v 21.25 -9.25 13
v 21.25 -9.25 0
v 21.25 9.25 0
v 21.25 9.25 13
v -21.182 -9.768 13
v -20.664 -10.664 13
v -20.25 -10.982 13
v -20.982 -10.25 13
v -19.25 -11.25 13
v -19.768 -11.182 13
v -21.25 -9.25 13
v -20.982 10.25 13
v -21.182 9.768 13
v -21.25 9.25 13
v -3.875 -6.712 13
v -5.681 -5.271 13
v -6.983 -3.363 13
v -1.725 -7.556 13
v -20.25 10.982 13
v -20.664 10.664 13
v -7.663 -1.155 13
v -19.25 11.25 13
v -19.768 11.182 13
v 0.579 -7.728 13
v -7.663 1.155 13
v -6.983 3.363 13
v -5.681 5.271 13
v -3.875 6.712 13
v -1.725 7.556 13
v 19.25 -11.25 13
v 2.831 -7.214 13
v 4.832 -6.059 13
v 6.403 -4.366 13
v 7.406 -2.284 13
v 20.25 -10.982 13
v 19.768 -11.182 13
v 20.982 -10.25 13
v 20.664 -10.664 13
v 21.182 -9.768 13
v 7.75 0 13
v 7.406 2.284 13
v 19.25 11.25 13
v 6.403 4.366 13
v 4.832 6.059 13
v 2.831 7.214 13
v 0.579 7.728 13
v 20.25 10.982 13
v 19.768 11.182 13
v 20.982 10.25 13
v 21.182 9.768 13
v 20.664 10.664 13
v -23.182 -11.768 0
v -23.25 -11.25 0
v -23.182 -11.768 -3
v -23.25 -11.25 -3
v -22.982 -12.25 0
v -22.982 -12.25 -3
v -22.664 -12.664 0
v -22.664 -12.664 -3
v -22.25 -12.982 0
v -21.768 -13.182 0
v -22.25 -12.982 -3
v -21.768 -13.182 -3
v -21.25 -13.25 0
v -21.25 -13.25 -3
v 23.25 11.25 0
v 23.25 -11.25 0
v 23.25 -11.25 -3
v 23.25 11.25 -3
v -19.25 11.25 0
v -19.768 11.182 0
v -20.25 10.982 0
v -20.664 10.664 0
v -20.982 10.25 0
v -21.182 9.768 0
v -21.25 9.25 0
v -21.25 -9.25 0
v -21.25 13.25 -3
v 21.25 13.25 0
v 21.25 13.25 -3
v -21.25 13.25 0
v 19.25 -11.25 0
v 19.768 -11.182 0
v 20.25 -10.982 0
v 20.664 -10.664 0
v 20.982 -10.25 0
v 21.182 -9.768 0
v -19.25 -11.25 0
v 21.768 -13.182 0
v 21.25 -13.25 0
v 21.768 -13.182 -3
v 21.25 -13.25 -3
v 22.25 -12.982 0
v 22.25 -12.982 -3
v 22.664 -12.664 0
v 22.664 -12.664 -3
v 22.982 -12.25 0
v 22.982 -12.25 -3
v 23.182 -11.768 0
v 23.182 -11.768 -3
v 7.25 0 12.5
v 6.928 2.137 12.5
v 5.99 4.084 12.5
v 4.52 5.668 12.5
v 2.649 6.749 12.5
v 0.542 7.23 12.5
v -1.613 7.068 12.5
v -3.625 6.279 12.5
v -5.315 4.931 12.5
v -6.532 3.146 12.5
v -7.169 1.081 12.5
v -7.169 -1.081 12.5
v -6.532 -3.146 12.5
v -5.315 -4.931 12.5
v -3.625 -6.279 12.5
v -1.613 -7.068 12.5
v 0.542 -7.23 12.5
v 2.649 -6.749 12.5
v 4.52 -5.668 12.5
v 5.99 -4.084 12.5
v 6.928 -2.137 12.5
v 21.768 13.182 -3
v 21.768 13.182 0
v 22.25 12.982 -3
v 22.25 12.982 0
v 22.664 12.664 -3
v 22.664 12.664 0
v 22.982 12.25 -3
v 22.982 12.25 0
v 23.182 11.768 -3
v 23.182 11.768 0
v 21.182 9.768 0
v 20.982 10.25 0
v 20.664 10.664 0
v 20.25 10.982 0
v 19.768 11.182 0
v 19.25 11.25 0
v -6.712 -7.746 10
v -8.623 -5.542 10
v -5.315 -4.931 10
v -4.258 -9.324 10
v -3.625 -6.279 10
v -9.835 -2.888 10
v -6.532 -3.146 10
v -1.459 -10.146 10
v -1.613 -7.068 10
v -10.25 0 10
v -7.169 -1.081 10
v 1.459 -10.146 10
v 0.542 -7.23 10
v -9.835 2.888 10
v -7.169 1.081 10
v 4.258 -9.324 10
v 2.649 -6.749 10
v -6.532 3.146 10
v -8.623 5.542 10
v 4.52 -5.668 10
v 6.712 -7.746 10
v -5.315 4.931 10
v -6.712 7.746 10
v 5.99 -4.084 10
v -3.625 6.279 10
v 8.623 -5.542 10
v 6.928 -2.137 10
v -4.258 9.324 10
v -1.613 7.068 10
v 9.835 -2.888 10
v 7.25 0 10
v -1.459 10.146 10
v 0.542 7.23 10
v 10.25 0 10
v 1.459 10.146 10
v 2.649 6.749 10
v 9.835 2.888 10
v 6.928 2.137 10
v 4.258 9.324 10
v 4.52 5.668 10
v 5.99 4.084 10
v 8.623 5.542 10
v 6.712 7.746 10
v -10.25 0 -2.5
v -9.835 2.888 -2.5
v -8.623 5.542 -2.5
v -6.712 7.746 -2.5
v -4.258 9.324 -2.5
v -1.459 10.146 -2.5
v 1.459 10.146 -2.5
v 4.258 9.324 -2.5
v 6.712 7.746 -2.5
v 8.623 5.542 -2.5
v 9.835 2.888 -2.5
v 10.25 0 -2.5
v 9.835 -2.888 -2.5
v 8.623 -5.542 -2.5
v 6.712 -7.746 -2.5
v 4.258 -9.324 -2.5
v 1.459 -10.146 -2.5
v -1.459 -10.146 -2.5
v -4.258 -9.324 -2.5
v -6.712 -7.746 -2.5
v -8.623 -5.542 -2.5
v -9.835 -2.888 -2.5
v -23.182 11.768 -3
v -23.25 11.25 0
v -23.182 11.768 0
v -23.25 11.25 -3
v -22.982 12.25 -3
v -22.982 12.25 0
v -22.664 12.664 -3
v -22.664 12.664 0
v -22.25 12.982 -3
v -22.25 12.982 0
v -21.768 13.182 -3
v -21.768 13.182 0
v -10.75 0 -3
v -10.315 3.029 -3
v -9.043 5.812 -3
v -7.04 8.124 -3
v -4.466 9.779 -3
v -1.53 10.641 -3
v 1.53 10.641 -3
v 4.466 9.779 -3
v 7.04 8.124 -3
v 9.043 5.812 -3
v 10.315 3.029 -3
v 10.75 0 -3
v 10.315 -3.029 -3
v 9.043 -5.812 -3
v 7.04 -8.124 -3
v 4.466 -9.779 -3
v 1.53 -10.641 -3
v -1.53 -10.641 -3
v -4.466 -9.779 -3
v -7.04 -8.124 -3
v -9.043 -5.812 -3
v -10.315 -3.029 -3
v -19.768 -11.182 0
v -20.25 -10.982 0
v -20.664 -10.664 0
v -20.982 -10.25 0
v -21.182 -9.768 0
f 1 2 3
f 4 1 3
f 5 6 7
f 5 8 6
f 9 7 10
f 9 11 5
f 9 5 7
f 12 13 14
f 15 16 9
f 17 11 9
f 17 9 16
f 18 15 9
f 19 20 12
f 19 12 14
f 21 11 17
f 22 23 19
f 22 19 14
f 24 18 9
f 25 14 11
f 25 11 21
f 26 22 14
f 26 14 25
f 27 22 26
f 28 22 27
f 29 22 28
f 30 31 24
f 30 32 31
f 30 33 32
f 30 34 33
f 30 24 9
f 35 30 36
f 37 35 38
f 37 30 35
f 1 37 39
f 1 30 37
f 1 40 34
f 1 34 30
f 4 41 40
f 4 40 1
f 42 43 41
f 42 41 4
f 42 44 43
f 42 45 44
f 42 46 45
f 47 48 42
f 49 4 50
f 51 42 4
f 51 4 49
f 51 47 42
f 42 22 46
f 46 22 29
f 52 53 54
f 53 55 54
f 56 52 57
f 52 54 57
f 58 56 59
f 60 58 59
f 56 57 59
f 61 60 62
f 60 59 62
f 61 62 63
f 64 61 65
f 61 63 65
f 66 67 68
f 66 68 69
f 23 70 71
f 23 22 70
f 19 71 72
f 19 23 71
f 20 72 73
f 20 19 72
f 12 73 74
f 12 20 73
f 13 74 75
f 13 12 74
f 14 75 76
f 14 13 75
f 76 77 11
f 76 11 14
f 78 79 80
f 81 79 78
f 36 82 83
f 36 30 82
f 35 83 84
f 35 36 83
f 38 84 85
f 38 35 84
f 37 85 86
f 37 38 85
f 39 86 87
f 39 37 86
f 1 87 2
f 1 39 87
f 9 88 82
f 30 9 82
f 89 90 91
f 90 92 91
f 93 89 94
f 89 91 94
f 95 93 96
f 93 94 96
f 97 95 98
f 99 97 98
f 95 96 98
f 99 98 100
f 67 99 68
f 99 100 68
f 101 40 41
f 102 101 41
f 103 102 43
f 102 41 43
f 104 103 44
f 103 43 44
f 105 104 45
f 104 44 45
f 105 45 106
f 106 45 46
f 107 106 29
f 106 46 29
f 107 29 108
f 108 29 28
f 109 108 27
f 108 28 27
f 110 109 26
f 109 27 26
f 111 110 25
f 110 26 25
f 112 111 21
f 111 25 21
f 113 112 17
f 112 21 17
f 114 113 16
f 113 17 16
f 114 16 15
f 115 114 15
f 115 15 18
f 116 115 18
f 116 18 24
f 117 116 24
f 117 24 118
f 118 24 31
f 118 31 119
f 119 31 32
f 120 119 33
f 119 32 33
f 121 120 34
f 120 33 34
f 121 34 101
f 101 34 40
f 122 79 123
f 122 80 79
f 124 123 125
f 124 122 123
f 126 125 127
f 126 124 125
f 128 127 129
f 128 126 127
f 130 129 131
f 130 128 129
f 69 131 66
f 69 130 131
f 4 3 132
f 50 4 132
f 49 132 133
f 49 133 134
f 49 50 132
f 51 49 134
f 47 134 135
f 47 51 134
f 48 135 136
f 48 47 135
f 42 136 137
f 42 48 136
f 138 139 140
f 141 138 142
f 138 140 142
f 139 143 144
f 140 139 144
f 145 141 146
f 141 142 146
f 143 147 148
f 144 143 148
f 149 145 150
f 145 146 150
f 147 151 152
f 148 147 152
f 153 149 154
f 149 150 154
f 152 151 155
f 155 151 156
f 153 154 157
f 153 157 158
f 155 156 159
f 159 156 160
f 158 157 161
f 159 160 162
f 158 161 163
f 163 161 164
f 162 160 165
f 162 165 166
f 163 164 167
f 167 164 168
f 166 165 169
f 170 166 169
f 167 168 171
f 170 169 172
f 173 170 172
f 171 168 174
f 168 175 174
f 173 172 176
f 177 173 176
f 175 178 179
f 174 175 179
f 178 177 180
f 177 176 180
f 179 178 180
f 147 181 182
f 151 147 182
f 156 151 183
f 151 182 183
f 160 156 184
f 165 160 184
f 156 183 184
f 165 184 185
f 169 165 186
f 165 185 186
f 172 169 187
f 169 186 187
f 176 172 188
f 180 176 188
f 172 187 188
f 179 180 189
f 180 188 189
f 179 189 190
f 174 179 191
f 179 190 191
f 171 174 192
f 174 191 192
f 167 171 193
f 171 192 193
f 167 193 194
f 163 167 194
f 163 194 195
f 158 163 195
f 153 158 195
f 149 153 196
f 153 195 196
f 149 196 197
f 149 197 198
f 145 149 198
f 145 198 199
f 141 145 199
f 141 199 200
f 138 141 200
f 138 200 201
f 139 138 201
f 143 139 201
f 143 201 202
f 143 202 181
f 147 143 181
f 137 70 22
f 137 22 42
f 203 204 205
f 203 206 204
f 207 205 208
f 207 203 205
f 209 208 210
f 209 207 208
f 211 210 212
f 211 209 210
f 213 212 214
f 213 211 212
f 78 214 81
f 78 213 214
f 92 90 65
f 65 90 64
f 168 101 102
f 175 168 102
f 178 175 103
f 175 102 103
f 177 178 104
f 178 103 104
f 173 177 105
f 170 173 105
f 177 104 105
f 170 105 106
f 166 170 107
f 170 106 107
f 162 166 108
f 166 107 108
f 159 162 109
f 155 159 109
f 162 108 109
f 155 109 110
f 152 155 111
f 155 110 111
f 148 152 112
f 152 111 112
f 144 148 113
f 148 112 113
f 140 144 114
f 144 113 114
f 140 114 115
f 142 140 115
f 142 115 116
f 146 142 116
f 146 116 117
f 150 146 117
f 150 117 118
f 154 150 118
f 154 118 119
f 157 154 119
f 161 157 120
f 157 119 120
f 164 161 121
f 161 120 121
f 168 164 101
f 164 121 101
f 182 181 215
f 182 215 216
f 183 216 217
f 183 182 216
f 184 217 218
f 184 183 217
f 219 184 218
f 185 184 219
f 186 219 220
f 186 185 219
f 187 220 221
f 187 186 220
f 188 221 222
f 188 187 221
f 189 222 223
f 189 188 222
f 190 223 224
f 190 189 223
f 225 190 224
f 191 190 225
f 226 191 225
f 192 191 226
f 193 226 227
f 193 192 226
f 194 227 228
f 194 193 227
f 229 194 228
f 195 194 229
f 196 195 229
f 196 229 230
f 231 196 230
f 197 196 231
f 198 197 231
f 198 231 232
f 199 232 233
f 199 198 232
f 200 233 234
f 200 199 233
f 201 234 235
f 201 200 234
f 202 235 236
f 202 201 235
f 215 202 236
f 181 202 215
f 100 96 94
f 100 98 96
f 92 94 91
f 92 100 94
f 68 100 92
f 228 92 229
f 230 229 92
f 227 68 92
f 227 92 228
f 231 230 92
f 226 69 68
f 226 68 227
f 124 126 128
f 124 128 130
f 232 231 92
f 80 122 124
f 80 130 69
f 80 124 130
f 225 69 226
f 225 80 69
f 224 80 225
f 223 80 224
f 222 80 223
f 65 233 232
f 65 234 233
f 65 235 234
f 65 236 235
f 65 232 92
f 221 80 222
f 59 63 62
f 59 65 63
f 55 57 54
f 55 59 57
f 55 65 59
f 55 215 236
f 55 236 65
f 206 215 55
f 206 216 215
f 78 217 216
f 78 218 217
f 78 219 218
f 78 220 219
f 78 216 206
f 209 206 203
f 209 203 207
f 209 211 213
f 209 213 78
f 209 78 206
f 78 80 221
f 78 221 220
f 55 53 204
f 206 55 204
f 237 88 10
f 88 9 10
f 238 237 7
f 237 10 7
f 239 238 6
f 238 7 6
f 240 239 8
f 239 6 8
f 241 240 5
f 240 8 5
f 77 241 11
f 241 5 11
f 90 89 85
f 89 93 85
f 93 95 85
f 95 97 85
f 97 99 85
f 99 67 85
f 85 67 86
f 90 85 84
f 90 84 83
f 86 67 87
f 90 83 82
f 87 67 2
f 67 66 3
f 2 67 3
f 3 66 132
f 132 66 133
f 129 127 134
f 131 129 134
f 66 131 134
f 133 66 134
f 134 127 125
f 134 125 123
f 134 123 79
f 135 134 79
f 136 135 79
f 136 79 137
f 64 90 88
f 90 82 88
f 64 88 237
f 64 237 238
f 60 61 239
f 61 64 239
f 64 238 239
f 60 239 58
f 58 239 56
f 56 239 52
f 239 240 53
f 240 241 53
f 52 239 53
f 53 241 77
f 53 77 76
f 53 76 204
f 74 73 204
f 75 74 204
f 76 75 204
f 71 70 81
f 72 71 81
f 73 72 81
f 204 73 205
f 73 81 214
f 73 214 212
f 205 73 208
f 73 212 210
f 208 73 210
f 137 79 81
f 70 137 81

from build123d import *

# Parameters (mm, degrees)
SKETCH1_W           = 42.5
SKETCH1_H           = 22.5
BOSS_EXTRUDE1_DEPTH = 13
SKETCH2_W           = 46.5
SKETCH2_H           = 26.5
BOSS_EXTRUDE2_DEPTH = 3
CUT_EXTRUDE2_REACH  = 18
SKETCH6_R           = 10.25
SKETCH7_R           = 10.25
SKETCH7_R_2         = 7.25
BOSS_EXTRUDE4_DEPTH = 3
FILLET1_R           = 2
CHAMFER1_SIZE       = 0.5


with BuildPart() as part:
    # Sketch1 → Boss-Extrude1 (new body)
    with BuildSketch(Plane.XY):
        Rectangle(SKETCH1_W, SKETCH1_H)
    extrude(amount=BOSS_EXTRUDE1_DEPTH)

    # Sketch2 → Boss-Extrude2 (add)
    with BuildSketch(Plane(origin=(0, 0, 0), x_dir=(-1, 0, 0), z_dir=(0, 0, -1))):
        Rectangle(SKETCH2_W, SKETCH2_H)
    extrude(amount=BOSS_EXTRUDE2_DEPTH)

    # Sketch6 → Cut-Extrude2 (cut, up to next)
    with BuildSketch(Plane(origin=(0, 0, -3), x_dir=(-1, 0, 0), z_dir=(0, 0, -1)), mode=Mode.PRIVATE) as cut_extrude2_sk1:
        Circle(SKETCH6_R)
    cut_extrude2_tool1 = extrude(cut_extrude2_sk1.sketch, amount=-CUT_EXTRUDE2_REACH, mode=Mode.PRIVATE) & part.part
    add(cut_extrude2_tool1.solids().sort_by_distance((0, 0, -3))[0], mode=Mode.SUBTRACT)

    # Sketch7 → Boss-Extrude4 (add)
    with BuildSketch(Plane.XY.offset(13)):
        Circle(SKETCH7_R)
        Circle(SKETCH7_R_2, mode=Mode.SUBTRACT)
    extrude(amount=-BOSS_EXTRUDE4_DEPTH)

    # Fillet1
    fillet1_edges = [part.edges().sort_by_distance(p)[0] for p in [
        (-23.25, -13.25, -1.5),
        (-23.25, 13.25, -1.5),
        (23.25, 13.25, -1.5),
        (23.25, -13.25, -1.5),
        (21.25, -11.25, 6.5),
        (-21.25, -11.25, 6.5),
        (-21.25, 11.25, 6.5),
        (21.25, 11.25, 6.5),
    ]]
    fillet(fillet1_edges, radius=FILLET1_R)

    # Chamfer1
    chamfer1_edges = [part.edges().sort_by_distance(p)[0] for p in [
        (10.25, 0, -3),
        (-7.25, 0, 13),
    ]]
    chamfer(chamfer1_edges, length=CHAMFER1_SIZE)


solid = part.part
